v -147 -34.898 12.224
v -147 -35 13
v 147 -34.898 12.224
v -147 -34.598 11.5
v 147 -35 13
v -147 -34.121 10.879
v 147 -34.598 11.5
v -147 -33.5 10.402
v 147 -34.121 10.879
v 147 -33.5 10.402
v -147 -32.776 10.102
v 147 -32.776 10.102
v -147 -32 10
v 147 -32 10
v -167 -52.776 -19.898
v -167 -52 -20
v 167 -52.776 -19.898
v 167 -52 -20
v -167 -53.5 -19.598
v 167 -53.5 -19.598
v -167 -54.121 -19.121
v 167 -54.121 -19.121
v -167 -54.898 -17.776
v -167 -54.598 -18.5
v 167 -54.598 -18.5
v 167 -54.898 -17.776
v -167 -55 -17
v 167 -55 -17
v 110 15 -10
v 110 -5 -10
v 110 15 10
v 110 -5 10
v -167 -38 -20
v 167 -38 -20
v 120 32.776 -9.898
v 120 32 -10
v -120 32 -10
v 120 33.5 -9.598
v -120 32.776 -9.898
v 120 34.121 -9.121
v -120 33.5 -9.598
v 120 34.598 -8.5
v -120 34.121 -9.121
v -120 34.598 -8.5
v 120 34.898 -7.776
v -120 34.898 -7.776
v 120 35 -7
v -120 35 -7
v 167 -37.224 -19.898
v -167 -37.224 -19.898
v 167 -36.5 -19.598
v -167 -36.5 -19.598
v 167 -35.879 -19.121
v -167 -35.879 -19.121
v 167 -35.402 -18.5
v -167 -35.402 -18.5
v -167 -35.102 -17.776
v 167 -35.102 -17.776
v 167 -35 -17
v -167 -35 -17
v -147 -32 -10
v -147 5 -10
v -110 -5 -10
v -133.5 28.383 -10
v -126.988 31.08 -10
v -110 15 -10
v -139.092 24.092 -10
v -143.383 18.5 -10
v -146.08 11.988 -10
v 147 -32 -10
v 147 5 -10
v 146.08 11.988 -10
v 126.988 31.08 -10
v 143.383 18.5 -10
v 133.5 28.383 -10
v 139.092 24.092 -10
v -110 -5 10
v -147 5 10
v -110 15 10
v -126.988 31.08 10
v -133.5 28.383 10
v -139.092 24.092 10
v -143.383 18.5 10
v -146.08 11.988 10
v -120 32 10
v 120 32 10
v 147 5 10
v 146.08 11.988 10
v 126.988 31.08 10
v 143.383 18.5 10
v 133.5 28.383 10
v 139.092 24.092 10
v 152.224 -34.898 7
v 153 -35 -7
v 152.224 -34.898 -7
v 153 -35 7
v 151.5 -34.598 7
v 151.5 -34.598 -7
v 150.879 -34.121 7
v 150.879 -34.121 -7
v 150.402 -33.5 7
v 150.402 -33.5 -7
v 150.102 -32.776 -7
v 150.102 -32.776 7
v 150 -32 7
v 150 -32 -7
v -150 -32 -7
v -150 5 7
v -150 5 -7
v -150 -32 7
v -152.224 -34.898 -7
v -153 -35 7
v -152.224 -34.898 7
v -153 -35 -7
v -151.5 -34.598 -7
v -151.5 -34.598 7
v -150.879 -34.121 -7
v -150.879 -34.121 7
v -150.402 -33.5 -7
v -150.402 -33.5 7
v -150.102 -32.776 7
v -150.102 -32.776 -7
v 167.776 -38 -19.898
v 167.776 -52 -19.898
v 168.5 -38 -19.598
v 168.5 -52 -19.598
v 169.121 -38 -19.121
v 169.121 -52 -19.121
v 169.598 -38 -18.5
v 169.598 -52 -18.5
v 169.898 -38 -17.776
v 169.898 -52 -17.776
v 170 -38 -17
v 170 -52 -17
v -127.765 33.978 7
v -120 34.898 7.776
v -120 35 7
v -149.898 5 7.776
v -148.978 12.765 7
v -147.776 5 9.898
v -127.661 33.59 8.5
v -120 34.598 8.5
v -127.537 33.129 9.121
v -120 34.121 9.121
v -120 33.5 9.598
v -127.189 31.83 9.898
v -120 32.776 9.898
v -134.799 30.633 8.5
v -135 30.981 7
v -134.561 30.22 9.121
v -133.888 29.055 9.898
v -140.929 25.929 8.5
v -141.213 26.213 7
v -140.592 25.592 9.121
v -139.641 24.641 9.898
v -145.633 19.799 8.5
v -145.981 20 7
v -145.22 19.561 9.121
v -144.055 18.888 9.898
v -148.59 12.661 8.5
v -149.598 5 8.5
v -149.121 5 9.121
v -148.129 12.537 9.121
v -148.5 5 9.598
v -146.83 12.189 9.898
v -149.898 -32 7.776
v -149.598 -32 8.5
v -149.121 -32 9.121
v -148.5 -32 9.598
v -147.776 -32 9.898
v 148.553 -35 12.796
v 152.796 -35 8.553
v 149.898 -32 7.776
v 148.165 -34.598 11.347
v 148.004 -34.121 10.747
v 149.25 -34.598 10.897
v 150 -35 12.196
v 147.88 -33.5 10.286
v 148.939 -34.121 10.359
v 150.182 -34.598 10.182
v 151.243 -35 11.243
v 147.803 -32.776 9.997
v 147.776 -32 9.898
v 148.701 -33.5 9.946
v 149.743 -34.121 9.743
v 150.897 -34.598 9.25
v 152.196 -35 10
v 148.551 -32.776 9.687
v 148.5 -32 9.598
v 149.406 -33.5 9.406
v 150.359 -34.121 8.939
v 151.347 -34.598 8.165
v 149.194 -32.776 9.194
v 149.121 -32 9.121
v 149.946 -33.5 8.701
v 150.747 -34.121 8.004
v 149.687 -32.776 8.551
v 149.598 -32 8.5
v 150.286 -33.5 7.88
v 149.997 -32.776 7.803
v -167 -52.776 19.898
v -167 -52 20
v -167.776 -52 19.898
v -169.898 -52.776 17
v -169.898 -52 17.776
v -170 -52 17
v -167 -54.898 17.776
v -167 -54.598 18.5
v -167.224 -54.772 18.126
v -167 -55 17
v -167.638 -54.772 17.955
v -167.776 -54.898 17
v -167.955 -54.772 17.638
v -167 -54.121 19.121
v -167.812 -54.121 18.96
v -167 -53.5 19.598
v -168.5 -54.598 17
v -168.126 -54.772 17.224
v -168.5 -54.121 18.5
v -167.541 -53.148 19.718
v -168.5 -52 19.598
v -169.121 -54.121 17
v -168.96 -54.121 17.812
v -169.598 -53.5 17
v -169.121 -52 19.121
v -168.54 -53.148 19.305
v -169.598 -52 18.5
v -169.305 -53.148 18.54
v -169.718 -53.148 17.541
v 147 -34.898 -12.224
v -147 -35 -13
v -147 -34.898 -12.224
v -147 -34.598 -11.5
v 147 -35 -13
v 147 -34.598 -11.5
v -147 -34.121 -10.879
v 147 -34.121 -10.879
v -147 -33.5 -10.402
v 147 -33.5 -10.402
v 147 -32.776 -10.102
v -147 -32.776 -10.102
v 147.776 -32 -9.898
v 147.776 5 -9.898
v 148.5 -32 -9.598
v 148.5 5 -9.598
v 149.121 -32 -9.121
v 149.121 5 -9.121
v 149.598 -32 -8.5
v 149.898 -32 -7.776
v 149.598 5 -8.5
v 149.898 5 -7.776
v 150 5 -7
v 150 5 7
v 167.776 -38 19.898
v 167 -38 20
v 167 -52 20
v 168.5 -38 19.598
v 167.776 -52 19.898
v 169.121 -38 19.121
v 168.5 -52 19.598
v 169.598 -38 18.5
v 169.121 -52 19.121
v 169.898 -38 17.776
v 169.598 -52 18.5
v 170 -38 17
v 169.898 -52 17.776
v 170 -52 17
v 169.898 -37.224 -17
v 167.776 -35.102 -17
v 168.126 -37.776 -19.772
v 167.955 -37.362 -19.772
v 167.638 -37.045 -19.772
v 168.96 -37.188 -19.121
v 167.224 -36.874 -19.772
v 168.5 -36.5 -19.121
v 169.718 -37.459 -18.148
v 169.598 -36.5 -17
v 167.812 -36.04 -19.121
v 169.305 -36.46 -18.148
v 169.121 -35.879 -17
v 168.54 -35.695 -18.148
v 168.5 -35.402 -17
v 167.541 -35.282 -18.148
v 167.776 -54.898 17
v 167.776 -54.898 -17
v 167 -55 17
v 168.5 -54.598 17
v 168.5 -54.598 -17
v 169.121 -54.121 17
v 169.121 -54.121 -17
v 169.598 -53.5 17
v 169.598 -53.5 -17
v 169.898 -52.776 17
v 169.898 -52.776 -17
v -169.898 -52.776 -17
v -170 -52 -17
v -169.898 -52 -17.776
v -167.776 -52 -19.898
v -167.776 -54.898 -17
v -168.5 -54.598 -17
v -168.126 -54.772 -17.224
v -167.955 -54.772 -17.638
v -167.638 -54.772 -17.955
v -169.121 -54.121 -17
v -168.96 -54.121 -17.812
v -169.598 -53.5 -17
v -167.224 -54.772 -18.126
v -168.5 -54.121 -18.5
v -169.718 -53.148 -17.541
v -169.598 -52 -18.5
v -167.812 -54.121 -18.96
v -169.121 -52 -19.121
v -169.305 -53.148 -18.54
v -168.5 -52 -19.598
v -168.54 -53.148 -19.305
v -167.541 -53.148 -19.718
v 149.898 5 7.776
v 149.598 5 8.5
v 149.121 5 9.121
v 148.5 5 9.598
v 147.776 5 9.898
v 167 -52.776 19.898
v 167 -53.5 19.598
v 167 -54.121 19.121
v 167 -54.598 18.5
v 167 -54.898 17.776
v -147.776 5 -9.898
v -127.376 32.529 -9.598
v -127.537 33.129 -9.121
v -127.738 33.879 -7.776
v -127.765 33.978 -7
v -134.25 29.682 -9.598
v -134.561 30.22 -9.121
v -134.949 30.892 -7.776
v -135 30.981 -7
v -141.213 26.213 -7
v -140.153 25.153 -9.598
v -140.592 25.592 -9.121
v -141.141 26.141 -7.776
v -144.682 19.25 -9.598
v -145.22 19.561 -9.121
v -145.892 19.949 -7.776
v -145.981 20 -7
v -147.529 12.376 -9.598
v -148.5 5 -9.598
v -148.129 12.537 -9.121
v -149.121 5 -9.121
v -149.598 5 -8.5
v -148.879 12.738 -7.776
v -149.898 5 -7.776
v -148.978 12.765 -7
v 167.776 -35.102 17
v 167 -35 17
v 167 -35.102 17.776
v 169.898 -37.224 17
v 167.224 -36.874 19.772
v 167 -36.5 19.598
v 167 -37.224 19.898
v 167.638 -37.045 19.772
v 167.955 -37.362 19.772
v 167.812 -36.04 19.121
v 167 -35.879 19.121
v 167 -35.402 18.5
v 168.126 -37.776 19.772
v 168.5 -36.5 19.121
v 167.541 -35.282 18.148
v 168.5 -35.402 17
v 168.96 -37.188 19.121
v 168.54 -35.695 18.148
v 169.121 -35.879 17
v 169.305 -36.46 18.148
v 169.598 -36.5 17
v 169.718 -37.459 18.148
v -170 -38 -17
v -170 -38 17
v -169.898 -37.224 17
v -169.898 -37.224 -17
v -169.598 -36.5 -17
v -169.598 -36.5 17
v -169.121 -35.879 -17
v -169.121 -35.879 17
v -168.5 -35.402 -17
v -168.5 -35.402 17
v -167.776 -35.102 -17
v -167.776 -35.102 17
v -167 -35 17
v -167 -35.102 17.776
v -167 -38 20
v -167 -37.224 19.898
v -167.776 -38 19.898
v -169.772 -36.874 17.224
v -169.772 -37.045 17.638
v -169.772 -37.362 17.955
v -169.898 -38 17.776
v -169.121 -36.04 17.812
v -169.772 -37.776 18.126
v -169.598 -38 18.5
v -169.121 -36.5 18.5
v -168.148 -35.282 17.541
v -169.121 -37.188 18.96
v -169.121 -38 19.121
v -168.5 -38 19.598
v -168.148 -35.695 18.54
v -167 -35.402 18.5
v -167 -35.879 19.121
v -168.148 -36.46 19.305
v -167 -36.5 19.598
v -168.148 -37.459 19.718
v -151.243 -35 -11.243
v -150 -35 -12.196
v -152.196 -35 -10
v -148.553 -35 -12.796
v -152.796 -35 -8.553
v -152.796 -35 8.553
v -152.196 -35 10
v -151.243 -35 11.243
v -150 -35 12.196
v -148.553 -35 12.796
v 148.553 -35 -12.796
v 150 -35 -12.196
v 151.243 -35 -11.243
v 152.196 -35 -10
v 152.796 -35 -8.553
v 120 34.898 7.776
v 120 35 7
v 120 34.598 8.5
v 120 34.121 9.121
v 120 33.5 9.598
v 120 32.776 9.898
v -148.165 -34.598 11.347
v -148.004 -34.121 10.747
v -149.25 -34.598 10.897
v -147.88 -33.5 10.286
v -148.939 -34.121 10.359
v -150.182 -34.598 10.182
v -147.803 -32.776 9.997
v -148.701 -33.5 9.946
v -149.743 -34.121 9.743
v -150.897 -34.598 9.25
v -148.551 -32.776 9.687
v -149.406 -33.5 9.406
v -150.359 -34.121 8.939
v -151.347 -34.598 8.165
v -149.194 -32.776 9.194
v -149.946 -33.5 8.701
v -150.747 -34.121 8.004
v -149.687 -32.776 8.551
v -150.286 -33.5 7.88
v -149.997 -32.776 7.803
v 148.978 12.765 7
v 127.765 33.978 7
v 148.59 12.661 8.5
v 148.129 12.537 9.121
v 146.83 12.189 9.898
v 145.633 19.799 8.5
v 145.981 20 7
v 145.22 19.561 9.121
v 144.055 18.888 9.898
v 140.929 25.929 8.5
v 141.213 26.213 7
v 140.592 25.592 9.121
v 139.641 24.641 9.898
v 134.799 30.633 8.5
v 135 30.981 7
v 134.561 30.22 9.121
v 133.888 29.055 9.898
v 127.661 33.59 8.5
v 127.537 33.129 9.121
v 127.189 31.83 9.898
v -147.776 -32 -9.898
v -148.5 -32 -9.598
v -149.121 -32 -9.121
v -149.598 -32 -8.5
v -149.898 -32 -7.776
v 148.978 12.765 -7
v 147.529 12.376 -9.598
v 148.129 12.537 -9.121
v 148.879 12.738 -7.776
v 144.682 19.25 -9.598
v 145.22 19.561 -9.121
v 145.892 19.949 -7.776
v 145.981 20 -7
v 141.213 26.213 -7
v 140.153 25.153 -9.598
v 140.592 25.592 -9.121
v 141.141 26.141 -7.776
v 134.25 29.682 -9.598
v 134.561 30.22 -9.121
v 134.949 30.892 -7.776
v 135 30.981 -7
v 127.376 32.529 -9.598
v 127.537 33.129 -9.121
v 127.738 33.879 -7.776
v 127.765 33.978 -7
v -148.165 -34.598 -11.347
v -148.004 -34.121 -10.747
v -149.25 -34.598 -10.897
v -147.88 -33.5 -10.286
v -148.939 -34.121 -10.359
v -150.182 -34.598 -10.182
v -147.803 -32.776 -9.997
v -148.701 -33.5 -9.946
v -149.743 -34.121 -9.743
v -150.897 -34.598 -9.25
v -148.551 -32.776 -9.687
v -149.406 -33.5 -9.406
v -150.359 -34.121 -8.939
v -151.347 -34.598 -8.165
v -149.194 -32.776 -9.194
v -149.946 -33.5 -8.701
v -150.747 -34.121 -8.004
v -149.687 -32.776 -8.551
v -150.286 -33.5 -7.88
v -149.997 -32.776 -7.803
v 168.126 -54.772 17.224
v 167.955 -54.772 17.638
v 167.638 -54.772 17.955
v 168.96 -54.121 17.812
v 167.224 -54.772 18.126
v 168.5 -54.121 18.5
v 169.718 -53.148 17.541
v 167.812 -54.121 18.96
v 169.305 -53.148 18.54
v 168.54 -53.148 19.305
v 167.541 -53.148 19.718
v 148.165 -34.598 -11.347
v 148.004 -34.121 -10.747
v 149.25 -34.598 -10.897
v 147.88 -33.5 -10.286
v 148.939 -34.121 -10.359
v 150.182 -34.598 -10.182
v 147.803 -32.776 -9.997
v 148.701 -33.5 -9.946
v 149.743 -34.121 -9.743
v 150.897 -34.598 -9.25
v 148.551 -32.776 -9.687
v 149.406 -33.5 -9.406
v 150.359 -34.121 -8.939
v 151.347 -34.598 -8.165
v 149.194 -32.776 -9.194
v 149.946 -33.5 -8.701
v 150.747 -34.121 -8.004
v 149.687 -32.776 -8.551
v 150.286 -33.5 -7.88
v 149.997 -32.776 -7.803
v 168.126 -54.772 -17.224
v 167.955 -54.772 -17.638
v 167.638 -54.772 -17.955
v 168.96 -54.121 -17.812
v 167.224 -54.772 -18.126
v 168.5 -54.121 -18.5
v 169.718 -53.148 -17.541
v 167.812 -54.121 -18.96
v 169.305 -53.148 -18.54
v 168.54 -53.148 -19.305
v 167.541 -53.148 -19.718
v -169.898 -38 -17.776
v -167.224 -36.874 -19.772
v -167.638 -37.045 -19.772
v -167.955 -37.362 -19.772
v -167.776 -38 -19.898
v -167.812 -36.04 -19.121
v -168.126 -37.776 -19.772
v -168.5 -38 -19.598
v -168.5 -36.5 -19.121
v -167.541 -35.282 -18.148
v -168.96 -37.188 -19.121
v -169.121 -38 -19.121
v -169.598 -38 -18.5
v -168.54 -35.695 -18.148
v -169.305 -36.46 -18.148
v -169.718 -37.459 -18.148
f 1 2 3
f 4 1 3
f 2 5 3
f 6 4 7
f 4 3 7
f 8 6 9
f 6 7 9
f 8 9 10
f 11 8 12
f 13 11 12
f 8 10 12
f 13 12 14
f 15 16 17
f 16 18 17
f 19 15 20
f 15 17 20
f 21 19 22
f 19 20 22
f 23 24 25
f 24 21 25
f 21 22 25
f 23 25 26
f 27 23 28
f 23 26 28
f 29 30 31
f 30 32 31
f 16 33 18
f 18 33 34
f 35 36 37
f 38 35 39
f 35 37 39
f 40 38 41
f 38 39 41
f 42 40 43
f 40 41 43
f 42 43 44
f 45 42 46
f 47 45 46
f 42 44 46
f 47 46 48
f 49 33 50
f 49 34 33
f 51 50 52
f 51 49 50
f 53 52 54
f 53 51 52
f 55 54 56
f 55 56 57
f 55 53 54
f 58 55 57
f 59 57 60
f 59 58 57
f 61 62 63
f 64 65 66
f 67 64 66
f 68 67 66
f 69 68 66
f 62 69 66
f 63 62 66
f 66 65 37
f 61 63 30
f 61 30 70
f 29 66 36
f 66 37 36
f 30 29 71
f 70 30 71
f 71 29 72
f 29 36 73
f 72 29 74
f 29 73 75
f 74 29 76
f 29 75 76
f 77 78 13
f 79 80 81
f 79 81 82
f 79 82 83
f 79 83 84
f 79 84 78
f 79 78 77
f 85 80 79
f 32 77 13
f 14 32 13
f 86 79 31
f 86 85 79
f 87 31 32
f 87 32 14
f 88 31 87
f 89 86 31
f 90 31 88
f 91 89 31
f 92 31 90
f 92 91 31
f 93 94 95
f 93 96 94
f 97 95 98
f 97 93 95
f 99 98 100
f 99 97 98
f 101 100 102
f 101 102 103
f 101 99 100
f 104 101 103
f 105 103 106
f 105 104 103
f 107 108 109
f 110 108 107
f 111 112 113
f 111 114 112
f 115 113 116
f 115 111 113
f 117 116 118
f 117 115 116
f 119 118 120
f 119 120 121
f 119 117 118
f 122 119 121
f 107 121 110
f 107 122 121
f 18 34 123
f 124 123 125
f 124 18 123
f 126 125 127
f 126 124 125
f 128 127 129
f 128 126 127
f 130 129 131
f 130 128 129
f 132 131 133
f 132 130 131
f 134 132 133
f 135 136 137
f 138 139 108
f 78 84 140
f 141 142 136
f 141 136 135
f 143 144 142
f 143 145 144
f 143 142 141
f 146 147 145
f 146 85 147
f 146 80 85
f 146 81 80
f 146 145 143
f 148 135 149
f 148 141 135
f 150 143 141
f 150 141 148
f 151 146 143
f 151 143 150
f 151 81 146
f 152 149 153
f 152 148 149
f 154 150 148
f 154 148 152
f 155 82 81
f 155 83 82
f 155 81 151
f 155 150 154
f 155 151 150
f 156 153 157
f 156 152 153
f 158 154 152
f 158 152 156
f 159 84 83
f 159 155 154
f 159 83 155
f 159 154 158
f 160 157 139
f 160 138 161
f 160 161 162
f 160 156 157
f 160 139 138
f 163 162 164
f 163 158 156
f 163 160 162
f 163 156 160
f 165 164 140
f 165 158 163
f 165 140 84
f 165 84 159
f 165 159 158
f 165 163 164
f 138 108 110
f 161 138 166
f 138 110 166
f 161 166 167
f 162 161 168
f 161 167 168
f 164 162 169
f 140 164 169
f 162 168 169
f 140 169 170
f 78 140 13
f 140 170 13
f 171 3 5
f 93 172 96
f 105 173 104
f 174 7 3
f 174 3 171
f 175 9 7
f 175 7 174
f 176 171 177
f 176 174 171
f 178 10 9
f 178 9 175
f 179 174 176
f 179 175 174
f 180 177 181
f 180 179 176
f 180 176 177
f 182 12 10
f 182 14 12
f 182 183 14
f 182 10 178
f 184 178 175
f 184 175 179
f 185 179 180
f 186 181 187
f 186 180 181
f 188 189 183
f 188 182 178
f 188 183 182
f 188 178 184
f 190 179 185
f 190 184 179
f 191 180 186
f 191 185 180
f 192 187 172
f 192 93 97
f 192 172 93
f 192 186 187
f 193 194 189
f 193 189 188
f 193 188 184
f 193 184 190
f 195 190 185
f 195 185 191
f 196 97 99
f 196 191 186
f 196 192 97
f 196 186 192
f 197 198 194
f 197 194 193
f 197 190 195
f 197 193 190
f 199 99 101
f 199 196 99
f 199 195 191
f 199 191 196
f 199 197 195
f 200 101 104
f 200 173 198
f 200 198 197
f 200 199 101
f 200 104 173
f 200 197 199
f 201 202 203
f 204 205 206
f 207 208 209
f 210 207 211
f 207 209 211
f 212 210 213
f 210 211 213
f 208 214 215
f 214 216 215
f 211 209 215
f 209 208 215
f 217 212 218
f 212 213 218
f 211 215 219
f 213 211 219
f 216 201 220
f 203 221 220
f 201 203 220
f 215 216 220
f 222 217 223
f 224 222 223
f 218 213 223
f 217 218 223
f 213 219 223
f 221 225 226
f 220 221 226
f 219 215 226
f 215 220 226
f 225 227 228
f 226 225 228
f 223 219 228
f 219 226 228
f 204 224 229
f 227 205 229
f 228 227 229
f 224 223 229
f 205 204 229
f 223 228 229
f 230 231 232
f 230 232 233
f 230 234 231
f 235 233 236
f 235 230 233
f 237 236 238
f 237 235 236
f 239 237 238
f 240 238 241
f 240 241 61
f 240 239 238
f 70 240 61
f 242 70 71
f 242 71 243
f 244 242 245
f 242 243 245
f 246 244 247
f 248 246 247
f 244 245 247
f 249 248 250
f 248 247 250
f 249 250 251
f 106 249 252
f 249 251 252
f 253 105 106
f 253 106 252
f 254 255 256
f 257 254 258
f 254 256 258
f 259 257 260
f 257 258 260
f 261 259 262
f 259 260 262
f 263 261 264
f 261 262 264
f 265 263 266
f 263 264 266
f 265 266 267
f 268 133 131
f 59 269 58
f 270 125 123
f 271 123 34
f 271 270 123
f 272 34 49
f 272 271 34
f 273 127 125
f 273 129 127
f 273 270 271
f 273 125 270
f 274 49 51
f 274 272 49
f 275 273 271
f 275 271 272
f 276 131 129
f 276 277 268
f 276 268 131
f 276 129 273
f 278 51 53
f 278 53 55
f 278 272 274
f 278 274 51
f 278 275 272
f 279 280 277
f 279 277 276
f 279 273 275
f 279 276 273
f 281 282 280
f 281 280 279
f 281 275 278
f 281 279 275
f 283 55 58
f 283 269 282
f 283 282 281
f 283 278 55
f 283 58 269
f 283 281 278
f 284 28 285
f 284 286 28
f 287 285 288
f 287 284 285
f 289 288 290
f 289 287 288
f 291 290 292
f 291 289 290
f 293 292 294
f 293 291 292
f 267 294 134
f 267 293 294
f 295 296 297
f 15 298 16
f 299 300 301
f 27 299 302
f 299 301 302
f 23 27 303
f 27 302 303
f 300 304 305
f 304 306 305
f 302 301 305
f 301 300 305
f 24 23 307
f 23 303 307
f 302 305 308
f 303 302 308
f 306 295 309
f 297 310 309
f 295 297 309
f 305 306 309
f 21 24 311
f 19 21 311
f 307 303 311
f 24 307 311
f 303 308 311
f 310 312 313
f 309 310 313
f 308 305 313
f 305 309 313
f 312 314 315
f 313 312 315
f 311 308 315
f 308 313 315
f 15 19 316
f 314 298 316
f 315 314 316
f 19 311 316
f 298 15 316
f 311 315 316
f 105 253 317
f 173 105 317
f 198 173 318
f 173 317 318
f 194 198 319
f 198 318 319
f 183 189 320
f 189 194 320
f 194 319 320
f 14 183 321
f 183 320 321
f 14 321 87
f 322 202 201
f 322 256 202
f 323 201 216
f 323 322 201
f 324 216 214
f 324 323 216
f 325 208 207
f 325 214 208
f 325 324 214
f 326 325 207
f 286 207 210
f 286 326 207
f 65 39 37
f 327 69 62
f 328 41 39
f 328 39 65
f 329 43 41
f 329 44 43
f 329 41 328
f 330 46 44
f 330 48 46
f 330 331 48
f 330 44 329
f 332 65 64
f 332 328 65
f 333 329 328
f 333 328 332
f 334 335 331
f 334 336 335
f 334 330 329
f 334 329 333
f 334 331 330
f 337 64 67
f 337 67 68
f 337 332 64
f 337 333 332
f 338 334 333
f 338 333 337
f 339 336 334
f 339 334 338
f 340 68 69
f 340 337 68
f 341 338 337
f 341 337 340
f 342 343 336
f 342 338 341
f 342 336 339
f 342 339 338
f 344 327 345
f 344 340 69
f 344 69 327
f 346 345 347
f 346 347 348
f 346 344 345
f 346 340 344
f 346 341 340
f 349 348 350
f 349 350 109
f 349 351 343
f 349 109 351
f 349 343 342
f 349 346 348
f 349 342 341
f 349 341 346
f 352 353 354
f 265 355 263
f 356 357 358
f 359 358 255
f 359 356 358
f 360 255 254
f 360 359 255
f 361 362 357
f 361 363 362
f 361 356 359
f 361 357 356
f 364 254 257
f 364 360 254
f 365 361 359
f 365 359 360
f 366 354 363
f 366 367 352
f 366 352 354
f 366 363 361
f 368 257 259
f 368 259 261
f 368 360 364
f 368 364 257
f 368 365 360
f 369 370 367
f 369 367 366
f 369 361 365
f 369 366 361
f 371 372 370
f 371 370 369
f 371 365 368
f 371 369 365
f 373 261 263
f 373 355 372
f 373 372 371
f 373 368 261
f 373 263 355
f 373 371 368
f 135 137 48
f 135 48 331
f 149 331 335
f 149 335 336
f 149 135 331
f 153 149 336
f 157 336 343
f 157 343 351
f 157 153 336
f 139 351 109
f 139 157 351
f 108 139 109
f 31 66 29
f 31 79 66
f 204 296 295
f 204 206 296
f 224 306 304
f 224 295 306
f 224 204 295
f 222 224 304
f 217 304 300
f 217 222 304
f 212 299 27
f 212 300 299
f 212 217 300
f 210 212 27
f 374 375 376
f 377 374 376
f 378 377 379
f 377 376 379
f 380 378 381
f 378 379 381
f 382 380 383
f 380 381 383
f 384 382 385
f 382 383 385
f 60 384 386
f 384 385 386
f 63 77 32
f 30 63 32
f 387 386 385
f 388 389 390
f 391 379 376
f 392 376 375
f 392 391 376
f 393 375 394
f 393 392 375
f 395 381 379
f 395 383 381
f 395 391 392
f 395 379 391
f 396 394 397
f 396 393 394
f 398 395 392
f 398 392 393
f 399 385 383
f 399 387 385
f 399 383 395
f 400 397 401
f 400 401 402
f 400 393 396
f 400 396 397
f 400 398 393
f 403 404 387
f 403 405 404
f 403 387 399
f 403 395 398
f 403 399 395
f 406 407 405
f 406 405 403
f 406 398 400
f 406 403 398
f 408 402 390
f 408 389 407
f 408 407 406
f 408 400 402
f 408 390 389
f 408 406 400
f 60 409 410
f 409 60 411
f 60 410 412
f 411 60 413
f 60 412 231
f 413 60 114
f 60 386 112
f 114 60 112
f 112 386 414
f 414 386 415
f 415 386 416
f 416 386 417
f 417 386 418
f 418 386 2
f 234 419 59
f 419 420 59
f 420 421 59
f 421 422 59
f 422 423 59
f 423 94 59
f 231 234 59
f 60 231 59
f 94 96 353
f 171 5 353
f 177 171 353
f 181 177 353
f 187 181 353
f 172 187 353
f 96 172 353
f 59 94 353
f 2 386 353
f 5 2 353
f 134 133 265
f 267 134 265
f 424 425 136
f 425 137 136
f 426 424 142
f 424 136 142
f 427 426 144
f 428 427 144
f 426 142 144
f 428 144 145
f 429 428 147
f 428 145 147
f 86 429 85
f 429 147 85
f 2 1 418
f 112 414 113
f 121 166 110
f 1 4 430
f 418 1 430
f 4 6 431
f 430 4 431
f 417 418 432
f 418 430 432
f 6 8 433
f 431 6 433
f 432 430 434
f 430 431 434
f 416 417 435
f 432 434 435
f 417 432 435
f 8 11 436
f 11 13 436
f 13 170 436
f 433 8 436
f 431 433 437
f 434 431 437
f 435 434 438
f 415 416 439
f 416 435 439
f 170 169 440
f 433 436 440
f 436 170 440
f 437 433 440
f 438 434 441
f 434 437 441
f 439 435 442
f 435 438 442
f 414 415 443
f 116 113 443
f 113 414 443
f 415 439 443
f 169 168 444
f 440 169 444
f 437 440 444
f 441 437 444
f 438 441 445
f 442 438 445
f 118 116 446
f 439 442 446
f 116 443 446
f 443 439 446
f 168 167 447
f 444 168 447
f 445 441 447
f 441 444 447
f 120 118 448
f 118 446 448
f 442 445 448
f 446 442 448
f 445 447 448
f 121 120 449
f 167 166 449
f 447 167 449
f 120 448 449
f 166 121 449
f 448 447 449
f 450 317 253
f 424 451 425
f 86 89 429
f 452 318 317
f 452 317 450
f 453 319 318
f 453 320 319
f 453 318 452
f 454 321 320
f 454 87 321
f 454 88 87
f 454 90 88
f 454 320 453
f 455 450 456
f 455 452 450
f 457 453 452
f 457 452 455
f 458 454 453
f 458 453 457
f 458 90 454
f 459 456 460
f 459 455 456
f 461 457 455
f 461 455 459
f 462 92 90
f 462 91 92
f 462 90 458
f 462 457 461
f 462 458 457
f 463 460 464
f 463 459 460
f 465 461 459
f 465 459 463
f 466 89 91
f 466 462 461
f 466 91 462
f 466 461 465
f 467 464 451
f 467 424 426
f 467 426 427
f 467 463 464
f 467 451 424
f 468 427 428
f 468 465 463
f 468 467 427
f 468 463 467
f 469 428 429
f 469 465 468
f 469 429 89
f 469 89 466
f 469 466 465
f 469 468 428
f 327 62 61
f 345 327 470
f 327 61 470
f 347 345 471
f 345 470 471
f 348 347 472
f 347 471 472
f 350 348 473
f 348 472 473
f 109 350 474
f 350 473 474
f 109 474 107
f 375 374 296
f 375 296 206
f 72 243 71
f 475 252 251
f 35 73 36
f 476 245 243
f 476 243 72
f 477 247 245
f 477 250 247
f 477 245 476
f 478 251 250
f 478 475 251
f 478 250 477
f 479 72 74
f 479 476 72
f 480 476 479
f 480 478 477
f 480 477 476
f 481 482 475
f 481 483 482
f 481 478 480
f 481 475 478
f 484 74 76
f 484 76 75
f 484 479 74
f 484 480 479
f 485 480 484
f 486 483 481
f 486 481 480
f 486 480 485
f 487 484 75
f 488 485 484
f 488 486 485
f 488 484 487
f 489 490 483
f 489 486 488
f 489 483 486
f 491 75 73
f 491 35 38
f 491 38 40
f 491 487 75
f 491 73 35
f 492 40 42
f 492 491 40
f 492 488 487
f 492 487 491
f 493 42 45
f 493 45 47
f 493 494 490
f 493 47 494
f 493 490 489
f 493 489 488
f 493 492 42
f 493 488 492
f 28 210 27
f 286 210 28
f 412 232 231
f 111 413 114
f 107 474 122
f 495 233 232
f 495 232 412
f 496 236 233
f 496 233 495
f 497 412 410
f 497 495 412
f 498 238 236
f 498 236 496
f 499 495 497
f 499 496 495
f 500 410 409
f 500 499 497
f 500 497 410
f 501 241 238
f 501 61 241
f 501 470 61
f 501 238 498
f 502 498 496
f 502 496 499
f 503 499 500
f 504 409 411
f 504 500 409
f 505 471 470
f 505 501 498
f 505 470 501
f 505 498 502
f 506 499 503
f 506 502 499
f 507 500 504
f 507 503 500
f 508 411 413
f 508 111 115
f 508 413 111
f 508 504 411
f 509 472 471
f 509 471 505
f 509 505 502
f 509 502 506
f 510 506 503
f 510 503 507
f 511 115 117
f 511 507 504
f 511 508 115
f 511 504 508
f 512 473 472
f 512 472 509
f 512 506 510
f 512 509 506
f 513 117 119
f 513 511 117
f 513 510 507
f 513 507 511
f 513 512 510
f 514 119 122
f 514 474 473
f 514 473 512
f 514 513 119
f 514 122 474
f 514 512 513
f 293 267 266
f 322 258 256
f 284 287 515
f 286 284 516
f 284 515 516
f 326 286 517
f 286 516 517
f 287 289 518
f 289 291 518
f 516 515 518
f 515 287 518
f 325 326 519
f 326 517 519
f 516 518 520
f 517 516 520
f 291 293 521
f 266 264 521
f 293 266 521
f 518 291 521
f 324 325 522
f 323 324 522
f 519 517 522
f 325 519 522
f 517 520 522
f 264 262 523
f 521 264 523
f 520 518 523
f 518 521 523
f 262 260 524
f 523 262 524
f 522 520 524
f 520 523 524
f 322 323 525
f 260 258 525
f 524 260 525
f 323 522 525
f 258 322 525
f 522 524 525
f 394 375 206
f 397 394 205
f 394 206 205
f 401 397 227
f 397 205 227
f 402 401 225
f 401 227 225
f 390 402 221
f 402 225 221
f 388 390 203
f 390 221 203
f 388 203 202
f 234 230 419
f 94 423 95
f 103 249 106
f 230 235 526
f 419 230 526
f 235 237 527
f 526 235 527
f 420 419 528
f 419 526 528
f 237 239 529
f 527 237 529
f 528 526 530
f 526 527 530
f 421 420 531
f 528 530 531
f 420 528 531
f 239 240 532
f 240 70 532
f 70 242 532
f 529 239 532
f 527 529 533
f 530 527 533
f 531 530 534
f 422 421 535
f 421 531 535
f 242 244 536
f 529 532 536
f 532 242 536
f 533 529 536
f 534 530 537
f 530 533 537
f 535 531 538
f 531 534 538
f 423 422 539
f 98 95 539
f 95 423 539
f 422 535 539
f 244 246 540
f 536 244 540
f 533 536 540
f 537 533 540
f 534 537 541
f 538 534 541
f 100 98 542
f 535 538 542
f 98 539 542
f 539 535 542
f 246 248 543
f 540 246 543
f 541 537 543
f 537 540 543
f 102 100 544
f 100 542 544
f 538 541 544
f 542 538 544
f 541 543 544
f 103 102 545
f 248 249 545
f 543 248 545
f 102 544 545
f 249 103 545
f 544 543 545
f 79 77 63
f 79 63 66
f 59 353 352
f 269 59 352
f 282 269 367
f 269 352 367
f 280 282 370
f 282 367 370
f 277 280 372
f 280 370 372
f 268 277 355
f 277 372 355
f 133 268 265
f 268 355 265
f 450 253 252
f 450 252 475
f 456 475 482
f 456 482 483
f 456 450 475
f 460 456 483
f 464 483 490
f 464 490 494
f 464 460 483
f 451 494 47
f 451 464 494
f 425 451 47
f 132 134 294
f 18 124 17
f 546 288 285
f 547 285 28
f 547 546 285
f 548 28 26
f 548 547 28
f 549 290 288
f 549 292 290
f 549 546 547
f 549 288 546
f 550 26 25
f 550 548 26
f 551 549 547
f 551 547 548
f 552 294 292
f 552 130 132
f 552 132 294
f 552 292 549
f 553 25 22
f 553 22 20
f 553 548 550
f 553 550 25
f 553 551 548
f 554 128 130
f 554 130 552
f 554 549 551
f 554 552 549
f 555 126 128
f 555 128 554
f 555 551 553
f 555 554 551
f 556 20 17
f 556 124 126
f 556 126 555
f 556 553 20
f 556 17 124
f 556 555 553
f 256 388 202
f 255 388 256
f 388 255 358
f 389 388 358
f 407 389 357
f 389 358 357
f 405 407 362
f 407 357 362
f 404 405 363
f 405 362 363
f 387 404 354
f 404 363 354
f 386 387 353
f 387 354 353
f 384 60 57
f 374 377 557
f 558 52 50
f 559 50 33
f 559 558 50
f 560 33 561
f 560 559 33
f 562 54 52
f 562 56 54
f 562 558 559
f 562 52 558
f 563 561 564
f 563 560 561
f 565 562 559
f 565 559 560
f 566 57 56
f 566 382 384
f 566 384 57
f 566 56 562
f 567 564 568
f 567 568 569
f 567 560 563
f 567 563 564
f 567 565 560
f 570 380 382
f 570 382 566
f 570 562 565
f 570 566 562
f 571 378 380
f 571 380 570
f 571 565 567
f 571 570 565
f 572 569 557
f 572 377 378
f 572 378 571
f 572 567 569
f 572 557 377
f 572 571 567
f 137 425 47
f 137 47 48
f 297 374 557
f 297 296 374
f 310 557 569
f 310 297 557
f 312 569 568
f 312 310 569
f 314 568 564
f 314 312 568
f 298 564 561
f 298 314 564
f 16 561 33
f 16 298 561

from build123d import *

# Parameters (mm, degrees)
SKETCH1_W           = 220
SKETCH1_H           = 20
BOSS_EXTRUDE1_DEPTH = 10
SKETCH2_W           = 340
SKETCH2_H           = 40
BOSS_EXTRUDE2_DEPTH = 20
FILLET1_R           = 3


with BuildPart() as part:
    # Sketch1 → Boss-Extrude1 (new, symmetric)
    with BuildSketch(Plane.XY):
        with BuildLine():
            Line((-150, -35), (150, -35))
            Line((150, -35), (150, 5))
            ThreePointArc((150, 5), (141.213203436, 26.213203436), (120, 35))
            Line((120, 35), (-120, 35))
            ThreePointArc((-120, 35), (-141.213203436, 26.213203436), (-150, 5))
            Line((-150, 5), (-150, -35))
        make_face()
        with Locations((0, 5)):
            Rectangle(SKETCH1_W, SKETCH1_H, mode=Mode.SUBTRACT)
    extrude(amount=BOSS_EXTRUDE1_DEPTH, both=True)

    # Sketch2 → Boss-Extrude2 (add)
    with BuildSketch(Plane.XZ.offset(35)):
        Rectangle(SKETCH2_W, SKETCH2_H)
    extrude(amount=BOSS_EXTRUDE2_DEPTH)

    # Fillet1
    fillet1_edges = [part.edges().sort_by_distance(p)[0] for p in [
        (150, -35, 0),
        (-150, -35, 0),
        (150, -15, 10),
        (141.213203436, 26.213203436, 10),
        (0, 35, 10),
        (-141.213203436, 26.213203436, 10),
        (170, -35, 0),
        (170, -45, -20),
        (0, -35, 20),
        (170, -45, 20),
        (-170, -35, 0),
        (-170, -45, 20),
        (0, -35, -20),
        (-170, -45, -20),
        (170, -55, 0),
        (0, -55, 20),
        (-170, -55, 0),
        (0, -55, -20),
        (-150, -15, 10),
        (-141.213203436, 26.213203436, -10),
        (0, 35, -10),
        (141.213203436, 26.213203436, -10),
        (150, -15, -10),
        (0, -35, -10),
        (-150, -15, -10),
        (0, -35, 10),
    ]]
    fillet(fillet1_edges, radius=FILLET1_R)


solid = part.part
